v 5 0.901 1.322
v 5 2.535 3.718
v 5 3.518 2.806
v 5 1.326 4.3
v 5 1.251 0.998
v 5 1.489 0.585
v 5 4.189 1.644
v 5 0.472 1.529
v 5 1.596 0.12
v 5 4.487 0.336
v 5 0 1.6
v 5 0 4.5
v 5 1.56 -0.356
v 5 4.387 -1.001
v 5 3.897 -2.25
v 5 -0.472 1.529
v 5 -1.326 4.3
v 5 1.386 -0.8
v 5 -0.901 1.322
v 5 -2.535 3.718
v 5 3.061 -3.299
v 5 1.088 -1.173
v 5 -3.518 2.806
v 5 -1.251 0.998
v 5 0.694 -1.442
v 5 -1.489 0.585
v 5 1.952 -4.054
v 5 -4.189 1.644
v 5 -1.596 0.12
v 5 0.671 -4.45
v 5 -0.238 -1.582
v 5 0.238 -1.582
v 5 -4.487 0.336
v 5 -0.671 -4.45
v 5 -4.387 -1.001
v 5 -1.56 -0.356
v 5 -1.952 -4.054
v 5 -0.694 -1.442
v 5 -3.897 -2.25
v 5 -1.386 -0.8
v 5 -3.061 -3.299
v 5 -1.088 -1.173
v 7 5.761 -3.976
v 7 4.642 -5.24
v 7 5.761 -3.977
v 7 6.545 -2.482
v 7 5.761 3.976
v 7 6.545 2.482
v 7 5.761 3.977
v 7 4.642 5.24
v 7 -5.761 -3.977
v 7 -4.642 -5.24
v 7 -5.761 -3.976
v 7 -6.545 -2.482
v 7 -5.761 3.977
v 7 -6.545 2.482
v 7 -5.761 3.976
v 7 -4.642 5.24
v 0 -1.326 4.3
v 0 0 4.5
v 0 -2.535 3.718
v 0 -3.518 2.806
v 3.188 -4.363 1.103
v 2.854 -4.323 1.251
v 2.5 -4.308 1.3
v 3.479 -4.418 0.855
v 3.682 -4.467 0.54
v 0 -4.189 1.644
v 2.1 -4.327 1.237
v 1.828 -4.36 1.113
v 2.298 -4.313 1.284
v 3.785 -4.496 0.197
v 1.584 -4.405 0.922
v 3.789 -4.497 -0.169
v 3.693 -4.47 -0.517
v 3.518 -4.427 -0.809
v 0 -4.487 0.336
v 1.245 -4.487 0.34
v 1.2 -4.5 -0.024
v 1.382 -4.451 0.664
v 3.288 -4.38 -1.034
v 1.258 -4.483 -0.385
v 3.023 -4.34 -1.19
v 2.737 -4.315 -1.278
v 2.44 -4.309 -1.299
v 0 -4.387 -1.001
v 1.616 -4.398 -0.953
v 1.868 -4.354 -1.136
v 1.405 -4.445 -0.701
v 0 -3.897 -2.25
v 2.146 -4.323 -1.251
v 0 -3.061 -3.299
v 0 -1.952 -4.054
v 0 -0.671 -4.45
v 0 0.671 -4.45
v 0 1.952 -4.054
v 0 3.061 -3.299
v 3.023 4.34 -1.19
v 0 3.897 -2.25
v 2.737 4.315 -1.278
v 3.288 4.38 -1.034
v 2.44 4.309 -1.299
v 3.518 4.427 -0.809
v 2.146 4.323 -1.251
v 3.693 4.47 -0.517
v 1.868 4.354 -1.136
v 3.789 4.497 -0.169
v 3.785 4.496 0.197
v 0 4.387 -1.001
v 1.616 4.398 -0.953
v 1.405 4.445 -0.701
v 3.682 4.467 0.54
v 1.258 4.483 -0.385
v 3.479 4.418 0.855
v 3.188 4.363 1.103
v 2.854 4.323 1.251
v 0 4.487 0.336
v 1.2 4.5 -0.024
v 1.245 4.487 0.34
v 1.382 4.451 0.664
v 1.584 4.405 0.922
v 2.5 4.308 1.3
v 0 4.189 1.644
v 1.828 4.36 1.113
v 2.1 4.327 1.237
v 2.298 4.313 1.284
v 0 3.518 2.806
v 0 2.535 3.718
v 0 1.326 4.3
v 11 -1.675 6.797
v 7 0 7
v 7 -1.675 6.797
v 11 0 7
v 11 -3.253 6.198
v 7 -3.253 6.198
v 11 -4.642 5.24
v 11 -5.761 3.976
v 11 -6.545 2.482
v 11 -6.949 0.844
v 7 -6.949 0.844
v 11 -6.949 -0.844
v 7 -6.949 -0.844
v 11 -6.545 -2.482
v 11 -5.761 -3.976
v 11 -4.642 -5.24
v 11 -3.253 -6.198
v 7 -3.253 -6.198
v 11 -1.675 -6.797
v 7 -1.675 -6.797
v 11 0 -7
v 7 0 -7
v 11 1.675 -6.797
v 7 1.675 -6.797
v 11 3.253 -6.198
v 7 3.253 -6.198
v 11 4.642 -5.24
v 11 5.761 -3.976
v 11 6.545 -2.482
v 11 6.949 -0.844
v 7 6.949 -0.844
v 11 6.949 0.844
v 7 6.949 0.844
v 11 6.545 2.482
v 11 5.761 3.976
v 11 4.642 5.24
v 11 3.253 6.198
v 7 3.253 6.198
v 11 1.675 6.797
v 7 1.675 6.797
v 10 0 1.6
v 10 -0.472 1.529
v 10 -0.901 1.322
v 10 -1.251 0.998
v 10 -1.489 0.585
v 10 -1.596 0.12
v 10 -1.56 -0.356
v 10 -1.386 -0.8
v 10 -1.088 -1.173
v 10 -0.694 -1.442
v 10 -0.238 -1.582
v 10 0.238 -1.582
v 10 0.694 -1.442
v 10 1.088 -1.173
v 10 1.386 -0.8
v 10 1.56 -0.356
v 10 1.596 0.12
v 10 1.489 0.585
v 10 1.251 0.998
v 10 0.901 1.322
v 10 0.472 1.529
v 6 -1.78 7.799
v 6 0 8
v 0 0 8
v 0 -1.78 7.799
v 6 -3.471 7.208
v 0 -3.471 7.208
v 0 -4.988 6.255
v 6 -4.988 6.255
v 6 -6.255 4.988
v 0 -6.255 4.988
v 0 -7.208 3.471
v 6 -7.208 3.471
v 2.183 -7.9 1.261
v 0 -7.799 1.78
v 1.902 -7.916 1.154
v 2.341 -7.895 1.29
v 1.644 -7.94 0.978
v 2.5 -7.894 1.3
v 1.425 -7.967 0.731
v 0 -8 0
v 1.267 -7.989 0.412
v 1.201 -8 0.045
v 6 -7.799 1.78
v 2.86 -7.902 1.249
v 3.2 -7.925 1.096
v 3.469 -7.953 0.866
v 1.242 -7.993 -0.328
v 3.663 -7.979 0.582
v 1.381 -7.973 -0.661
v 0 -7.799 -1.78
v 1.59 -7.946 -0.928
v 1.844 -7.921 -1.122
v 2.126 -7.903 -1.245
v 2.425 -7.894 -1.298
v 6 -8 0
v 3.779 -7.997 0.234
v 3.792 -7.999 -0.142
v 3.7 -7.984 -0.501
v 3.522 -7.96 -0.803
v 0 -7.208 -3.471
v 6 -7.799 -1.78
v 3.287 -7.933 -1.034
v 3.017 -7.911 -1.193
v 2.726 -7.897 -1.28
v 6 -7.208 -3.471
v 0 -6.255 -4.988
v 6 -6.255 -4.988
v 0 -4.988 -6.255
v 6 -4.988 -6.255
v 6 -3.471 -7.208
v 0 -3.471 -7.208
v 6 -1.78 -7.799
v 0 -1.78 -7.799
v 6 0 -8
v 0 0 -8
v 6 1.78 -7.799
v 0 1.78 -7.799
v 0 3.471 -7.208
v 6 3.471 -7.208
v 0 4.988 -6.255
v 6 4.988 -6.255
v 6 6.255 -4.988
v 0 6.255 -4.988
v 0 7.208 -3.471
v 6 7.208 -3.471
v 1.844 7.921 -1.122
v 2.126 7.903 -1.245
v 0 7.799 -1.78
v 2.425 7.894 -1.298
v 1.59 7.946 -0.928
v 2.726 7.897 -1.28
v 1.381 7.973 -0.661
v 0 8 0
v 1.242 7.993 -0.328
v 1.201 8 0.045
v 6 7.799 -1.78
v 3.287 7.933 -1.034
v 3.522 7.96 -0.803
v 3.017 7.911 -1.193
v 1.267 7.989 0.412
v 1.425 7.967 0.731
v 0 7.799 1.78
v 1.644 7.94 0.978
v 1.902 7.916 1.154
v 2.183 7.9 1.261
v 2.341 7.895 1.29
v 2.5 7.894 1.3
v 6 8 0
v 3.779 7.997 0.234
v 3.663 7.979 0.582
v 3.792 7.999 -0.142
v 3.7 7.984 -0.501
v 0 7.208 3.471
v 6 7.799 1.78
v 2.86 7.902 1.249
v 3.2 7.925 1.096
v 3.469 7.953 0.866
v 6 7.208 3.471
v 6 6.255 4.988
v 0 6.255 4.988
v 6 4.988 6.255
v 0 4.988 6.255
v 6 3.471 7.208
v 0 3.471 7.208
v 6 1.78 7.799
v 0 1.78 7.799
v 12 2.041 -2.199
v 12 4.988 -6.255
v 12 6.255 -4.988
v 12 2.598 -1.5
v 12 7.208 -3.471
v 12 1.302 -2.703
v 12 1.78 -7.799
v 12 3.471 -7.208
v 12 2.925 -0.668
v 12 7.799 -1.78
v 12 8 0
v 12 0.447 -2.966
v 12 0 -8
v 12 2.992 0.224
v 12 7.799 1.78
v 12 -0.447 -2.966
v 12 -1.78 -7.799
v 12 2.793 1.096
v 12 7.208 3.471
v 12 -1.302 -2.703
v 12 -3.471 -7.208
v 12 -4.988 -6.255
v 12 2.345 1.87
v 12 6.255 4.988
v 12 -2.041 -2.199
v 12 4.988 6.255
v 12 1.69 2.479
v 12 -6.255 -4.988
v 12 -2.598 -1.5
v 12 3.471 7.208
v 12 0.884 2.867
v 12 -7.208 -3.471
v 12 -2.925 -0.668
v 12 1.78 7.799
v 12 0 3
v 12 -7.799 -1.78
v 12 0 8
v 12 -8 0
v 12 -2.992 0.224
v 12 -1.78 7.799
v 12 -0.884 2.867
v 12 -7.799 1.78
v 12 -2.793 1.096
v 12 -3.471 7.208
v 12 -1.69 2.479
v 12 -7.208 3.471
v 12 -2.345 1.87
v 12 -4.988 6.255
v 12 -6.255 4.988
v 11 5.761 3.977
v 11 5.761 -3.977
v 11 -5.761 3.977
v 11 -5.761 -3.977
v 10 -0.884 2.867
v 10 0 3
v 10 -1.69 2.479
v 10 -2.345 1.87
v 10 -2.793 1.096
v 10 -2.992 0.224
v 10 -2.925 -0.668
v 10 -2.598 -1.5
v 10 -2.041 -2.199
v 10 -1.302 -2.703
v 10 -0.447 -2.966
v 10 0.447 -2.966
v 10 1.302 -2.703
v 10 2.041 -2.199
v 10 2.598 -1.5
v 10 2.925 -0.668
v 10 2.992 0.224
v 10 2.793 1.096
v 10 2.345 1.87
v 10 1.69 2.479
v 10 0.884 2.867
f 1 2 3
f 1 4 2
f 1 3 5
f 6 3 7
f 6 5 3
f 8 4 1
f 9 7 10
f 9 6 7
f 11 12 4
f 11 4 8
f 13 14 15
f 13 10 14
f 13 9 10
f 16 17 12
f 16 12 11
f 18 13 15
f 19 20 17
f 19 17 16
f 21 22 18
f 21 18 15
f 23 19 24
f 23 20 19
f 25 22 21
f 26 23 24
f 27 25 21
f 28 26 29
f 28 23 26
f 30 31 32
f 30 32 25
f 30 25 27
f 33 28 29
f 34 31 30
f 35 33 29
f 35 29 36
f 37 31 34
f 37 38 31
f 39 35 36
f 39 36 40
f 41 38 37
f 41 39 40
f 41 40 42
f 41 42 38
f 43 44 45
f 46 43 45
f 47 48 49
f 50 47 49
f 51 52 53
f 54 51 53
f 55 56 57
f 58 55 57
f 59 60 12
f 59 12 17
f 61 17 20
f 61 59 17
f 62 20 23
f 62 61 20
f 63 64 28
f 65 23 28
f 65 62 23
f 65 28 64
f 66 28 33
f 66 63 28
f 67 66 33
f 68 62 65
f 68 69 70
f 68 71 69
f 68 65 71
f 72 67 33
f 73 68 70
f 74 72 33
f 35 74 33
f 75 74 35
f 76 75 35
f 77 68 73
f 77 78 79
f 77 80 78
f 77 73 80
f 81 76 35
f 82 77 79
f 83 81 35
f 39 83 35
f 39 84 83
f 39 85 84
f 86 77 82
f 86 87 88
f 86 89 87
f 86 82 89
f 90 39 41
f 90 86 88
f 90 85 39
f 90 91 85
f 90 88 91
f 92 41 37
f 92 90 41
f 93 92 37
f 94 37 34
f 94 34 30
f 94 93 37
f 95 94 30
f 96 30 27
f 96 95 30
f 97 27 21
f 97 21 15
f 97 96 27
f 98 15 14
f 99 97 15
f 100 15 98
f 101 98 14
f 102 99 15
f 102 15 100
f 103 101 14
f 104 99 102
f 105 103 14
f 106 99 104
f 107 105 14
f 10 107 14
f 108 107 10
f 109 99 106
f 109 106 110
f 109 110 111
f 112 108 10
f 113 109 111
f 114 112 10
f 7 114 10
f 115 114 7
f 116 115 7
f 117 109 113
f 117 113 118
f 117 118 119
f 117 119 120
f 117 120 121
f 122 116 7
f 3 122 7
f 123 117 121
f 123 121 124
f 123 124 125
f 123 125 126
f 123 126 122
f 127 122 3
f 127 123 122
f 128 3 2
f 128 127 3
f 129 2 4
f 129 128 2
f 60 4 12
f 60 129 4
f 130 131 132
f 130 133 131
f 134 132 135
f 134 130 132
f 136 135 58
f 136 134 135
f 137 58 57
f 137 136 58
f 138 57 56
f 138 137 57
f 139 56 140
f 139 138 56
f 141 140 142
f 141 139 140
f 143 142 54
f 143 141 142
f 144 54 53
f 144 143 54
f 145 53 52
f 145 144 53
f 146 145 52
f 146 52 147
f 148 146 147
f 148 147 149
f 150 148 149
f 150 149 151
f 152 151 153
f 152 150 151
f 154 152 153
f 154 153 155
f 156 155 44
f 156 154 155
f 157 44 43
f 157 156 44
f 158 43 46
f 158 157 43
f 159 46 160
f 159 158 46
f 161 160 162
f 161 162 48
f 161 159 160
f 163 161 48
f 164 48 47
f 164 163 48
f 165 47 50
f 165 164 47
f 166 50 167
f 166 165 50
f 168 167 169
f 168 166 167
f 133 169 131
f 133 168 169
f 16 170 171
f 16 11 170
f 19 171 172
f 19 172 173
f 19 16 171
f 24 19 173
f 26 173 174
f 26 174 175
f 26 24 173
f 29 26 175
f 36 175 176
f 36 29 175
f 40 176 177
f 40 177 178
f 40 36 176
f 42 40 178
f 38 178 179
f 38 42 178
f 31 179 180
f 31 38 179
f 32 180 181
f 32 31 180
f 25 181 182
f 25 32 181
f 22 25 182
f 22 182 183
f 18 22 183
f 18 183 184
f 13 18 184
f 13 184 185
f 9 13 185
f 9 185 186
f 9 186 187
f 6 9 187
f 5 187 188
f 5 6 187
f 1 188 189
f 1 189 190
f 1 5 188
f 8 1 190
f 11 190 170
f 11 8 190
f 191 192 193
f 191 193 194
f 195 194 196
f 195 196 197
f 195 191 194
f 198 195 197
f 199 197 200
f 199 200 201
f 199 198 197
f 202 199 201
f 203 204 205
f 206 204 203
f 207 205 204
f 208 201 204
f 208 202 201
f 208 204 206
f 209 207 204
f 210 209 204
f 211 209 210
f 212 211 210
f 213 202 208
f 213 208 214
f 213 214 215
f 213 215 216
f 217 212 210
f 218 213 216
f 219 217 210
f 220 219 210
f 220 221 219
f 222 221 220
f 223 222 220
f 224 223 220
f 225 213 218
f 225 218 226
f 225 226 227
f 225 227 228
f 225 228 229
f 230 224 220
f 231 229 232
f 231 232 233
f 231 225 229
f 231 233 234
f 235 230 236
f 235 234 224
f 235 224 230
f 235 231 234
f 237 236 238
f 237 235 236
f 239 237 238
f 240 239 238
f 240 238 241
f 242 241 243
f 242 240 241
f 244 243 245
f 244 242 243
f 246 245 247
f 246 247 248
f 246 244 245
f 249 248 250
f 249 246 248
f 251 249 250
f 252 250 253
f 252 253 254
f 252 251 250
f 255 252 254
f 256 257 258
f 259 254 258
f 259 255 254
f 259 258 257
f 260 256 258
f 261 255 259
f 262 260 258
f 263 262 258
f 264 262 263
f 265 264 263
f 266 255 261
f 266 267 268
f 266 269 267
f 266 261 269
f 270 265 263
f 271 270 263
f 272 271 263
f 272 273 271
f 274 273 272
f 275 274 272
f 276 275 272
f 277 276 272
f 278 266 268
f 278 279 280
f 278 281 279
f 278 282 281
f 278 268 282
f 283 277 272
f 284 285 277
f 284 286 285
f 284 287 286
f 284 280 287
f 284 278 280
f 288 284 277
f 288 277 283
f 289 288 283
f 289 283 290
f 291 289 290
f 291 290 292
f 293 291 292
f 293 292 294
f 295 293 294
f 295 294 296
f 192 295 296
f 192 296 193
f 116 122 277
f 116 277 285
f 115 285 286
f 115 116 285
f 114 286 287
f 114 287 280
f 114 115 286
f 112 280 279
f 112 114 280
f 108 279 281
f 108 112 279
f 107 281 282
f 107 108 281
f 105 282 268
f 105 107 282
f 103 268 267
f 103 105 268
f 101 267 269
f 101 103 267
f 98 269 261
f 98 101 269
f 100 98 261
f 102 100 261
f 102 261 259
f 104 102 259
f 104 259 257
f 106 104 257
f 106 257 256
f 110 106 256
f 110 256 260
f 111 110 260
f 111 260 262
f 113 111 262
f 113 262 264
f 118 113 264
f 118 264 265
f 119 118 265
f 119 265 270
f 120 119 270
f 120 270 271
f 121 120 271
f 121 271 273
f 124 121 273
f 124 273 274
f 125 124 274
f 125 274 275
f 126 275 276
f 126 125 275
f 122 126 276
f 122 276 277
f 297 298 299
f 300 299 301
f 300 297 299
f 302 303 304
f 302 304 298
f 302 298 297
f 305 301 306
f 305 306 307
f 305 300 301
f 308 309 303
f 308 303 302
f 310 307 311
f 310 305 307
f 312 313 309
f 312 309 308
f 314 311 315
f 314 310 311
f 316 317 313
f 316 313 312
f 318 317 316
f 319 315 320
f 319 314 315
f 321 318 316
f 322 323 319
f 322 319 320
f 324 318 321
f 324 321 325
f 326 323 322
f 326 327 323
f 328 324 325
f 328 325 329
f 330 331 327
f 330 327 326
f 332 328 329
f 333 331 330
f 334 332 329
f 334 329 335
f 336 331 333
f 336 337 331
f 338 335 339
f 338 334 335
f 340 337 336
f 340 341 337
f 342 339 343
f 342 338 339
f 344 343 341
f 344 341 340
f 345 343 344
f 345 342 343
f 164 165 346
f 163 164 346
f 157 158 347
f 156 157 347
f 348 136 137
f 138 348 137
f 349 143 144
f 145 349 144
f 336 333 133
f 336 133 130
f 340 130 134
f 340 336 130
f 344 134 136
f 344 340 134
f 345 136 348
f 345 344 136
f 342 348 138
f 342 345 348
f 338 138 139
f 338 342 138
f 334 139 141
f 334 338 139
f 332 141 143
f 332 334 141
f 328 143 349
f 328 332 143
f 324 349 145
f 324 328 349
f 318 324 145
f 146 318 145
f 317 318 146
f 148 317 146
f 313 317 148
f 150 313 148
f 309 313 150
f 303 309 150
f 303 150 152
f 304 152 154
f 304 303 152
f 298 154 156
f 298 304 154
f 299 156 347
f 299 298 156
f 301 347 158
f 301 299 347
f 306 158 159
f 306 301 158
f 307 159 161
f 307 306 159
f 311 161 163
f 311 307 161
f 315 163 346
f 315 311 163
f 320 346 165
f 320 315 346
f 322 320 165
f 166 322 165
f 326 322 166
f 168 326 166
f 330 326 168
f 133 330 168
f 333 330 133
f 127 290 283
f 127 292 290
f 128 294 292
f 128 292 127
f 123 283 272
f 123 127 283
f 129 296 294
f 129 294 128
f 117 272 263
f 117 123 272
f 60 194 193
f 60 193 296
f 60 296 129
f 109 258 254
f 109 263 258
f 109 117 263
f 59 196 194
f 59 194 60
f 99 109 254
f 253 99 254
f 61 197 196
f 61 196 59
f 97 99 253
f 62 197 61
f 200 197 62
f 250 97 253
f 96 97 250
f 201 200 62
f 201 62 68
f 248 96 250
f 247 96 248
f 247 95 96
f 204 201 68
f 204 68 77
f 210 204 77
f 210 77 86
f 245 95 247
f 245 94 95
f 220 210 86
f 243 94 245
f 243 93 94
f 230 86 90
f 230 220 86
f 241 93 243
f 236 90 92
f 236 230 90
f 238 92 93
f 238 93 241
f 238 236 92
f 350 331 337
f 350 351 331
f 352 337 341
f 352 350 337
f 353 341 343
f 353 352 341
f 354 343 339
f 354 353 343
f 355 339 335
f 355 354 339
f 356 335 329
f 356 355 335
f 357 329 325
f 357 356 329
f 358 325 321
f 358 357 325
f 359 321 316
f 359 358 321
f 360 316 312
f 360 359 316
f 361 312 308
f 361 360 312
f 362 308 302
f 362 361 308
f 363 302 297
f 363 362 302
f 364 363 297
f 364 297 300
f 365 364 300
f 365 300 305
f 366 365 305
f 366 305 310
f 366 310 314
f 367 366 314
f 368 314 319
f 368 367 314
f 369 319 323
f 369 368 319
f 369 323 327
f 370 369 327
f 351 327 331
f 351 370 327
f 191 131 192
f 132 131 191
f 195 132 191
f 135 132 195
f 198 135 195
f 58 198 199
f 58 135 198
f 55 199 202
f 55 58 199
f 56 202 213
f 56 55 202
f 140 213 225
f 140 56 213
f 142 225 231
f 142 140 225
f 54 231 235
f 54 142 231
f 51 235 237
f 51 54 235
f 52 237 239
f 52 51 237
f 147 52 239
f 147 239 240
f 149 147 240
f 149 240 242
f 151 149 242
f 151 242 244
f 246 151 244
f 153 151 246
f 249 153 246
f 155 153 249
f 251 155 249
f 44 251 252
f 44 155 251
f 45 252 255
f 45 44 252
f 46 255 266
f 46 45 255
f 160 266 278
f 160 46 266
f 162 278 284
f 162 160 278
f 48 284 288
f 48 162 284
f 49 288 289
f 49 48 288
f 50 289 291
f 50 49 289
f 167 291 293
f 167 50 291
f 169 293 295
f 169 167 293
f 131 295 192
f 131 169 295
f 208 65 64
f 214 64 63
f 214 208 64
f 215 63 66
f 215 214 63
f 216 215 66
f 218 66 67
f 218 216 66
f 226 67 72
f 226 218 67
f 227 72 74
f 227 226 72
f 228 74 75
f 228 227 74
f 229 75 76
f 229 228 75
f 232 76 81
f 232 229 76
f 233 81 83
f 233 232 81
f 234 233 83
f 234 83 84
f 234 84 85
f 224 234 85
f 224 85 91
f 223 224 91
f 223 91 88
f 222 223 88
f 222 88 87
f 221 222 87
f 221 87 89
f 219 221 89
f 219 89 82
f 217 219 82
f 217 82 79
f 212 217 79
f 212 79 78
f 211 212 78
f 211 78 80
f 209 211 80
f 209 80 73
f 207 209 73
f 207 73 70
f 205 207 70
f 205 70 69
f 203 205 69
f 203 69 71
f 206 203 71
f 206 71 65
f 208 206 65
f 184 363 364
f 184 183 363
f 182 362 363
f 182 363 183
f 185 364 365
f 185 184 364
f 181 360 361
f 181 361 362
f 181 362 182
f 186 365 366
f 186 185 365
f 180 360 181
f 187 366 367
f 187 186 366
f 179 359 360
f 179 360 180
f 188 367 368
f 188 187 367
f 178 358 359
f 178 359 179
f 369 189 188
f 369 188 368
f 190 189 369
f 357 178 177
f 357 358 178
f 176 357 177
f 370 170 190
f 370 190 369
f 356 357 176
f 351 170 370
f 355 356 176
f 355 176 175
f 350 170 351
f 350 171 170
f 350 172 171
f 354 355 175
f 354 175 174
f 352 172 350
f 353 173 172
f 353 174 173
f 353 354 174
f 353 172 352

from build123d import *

# Parameters (mm, degrees)
CUT_EXTRUDE1_DEPTH      = 17.492422502
CUT_EXTRUDE1_DEPTH_BACK = 17.492422502
SKETCH2_R               = 1.3
CHAMFER1_SIZE           = 1


with BuildPart() as part:
    # Sketch1 → Revolve1 (revolve)
    with BuildSketch(Plane.XY, mode=Mode.PRIVATE) as revolve1_sk:
        Polygon((0, 4.5), (0, 8), (7, 8), (7, 7), (11, 7), (11, 8), (12, 8), (12, 3), (10, 3), (10, 1.6), (5, 1.6), (5, 4.5), align=None)
    revolve(revolve1_sk.sketch.rotate(Axis((0, 0, 0), (1, 0, 0)), 90), axis=Axis((0, 0, 0), (1, 0, 0)))

    # Sketch2 → Cut-Extrude1 (cut, two sides: drawn at the far end of the back side and taken through both)
    with BuildSketch(Plane(origin=(0, 0, 0), x_dir=(1, 0, 0), z_dir=(0, 1, 0)).offset(-CUT_EXTRUDE1_DEPTH_BACK)):
        with Locations(Location((2.5, 0, 0), (0, 0, 270))):
            Circle(SKETCH2_R)
    extrude(amount=CUT_EXTRUDE1_DEPTH + CUT_EXTRUDE1_DEPTH_BACK, mode=Mode.SUBTRACT)

    # Chamfer1
    chamfer1_edges = [part.edges().sort_by_distance(p)[0] for p in [
        (11, 0, -8),
        (7, 0, -8),
    ]]
    chamfer(chamfer1_edges, length=CHAMFER1_SIZE - 0.0001)  # a hair under: the kernel refuses the full size


solid = part.part
